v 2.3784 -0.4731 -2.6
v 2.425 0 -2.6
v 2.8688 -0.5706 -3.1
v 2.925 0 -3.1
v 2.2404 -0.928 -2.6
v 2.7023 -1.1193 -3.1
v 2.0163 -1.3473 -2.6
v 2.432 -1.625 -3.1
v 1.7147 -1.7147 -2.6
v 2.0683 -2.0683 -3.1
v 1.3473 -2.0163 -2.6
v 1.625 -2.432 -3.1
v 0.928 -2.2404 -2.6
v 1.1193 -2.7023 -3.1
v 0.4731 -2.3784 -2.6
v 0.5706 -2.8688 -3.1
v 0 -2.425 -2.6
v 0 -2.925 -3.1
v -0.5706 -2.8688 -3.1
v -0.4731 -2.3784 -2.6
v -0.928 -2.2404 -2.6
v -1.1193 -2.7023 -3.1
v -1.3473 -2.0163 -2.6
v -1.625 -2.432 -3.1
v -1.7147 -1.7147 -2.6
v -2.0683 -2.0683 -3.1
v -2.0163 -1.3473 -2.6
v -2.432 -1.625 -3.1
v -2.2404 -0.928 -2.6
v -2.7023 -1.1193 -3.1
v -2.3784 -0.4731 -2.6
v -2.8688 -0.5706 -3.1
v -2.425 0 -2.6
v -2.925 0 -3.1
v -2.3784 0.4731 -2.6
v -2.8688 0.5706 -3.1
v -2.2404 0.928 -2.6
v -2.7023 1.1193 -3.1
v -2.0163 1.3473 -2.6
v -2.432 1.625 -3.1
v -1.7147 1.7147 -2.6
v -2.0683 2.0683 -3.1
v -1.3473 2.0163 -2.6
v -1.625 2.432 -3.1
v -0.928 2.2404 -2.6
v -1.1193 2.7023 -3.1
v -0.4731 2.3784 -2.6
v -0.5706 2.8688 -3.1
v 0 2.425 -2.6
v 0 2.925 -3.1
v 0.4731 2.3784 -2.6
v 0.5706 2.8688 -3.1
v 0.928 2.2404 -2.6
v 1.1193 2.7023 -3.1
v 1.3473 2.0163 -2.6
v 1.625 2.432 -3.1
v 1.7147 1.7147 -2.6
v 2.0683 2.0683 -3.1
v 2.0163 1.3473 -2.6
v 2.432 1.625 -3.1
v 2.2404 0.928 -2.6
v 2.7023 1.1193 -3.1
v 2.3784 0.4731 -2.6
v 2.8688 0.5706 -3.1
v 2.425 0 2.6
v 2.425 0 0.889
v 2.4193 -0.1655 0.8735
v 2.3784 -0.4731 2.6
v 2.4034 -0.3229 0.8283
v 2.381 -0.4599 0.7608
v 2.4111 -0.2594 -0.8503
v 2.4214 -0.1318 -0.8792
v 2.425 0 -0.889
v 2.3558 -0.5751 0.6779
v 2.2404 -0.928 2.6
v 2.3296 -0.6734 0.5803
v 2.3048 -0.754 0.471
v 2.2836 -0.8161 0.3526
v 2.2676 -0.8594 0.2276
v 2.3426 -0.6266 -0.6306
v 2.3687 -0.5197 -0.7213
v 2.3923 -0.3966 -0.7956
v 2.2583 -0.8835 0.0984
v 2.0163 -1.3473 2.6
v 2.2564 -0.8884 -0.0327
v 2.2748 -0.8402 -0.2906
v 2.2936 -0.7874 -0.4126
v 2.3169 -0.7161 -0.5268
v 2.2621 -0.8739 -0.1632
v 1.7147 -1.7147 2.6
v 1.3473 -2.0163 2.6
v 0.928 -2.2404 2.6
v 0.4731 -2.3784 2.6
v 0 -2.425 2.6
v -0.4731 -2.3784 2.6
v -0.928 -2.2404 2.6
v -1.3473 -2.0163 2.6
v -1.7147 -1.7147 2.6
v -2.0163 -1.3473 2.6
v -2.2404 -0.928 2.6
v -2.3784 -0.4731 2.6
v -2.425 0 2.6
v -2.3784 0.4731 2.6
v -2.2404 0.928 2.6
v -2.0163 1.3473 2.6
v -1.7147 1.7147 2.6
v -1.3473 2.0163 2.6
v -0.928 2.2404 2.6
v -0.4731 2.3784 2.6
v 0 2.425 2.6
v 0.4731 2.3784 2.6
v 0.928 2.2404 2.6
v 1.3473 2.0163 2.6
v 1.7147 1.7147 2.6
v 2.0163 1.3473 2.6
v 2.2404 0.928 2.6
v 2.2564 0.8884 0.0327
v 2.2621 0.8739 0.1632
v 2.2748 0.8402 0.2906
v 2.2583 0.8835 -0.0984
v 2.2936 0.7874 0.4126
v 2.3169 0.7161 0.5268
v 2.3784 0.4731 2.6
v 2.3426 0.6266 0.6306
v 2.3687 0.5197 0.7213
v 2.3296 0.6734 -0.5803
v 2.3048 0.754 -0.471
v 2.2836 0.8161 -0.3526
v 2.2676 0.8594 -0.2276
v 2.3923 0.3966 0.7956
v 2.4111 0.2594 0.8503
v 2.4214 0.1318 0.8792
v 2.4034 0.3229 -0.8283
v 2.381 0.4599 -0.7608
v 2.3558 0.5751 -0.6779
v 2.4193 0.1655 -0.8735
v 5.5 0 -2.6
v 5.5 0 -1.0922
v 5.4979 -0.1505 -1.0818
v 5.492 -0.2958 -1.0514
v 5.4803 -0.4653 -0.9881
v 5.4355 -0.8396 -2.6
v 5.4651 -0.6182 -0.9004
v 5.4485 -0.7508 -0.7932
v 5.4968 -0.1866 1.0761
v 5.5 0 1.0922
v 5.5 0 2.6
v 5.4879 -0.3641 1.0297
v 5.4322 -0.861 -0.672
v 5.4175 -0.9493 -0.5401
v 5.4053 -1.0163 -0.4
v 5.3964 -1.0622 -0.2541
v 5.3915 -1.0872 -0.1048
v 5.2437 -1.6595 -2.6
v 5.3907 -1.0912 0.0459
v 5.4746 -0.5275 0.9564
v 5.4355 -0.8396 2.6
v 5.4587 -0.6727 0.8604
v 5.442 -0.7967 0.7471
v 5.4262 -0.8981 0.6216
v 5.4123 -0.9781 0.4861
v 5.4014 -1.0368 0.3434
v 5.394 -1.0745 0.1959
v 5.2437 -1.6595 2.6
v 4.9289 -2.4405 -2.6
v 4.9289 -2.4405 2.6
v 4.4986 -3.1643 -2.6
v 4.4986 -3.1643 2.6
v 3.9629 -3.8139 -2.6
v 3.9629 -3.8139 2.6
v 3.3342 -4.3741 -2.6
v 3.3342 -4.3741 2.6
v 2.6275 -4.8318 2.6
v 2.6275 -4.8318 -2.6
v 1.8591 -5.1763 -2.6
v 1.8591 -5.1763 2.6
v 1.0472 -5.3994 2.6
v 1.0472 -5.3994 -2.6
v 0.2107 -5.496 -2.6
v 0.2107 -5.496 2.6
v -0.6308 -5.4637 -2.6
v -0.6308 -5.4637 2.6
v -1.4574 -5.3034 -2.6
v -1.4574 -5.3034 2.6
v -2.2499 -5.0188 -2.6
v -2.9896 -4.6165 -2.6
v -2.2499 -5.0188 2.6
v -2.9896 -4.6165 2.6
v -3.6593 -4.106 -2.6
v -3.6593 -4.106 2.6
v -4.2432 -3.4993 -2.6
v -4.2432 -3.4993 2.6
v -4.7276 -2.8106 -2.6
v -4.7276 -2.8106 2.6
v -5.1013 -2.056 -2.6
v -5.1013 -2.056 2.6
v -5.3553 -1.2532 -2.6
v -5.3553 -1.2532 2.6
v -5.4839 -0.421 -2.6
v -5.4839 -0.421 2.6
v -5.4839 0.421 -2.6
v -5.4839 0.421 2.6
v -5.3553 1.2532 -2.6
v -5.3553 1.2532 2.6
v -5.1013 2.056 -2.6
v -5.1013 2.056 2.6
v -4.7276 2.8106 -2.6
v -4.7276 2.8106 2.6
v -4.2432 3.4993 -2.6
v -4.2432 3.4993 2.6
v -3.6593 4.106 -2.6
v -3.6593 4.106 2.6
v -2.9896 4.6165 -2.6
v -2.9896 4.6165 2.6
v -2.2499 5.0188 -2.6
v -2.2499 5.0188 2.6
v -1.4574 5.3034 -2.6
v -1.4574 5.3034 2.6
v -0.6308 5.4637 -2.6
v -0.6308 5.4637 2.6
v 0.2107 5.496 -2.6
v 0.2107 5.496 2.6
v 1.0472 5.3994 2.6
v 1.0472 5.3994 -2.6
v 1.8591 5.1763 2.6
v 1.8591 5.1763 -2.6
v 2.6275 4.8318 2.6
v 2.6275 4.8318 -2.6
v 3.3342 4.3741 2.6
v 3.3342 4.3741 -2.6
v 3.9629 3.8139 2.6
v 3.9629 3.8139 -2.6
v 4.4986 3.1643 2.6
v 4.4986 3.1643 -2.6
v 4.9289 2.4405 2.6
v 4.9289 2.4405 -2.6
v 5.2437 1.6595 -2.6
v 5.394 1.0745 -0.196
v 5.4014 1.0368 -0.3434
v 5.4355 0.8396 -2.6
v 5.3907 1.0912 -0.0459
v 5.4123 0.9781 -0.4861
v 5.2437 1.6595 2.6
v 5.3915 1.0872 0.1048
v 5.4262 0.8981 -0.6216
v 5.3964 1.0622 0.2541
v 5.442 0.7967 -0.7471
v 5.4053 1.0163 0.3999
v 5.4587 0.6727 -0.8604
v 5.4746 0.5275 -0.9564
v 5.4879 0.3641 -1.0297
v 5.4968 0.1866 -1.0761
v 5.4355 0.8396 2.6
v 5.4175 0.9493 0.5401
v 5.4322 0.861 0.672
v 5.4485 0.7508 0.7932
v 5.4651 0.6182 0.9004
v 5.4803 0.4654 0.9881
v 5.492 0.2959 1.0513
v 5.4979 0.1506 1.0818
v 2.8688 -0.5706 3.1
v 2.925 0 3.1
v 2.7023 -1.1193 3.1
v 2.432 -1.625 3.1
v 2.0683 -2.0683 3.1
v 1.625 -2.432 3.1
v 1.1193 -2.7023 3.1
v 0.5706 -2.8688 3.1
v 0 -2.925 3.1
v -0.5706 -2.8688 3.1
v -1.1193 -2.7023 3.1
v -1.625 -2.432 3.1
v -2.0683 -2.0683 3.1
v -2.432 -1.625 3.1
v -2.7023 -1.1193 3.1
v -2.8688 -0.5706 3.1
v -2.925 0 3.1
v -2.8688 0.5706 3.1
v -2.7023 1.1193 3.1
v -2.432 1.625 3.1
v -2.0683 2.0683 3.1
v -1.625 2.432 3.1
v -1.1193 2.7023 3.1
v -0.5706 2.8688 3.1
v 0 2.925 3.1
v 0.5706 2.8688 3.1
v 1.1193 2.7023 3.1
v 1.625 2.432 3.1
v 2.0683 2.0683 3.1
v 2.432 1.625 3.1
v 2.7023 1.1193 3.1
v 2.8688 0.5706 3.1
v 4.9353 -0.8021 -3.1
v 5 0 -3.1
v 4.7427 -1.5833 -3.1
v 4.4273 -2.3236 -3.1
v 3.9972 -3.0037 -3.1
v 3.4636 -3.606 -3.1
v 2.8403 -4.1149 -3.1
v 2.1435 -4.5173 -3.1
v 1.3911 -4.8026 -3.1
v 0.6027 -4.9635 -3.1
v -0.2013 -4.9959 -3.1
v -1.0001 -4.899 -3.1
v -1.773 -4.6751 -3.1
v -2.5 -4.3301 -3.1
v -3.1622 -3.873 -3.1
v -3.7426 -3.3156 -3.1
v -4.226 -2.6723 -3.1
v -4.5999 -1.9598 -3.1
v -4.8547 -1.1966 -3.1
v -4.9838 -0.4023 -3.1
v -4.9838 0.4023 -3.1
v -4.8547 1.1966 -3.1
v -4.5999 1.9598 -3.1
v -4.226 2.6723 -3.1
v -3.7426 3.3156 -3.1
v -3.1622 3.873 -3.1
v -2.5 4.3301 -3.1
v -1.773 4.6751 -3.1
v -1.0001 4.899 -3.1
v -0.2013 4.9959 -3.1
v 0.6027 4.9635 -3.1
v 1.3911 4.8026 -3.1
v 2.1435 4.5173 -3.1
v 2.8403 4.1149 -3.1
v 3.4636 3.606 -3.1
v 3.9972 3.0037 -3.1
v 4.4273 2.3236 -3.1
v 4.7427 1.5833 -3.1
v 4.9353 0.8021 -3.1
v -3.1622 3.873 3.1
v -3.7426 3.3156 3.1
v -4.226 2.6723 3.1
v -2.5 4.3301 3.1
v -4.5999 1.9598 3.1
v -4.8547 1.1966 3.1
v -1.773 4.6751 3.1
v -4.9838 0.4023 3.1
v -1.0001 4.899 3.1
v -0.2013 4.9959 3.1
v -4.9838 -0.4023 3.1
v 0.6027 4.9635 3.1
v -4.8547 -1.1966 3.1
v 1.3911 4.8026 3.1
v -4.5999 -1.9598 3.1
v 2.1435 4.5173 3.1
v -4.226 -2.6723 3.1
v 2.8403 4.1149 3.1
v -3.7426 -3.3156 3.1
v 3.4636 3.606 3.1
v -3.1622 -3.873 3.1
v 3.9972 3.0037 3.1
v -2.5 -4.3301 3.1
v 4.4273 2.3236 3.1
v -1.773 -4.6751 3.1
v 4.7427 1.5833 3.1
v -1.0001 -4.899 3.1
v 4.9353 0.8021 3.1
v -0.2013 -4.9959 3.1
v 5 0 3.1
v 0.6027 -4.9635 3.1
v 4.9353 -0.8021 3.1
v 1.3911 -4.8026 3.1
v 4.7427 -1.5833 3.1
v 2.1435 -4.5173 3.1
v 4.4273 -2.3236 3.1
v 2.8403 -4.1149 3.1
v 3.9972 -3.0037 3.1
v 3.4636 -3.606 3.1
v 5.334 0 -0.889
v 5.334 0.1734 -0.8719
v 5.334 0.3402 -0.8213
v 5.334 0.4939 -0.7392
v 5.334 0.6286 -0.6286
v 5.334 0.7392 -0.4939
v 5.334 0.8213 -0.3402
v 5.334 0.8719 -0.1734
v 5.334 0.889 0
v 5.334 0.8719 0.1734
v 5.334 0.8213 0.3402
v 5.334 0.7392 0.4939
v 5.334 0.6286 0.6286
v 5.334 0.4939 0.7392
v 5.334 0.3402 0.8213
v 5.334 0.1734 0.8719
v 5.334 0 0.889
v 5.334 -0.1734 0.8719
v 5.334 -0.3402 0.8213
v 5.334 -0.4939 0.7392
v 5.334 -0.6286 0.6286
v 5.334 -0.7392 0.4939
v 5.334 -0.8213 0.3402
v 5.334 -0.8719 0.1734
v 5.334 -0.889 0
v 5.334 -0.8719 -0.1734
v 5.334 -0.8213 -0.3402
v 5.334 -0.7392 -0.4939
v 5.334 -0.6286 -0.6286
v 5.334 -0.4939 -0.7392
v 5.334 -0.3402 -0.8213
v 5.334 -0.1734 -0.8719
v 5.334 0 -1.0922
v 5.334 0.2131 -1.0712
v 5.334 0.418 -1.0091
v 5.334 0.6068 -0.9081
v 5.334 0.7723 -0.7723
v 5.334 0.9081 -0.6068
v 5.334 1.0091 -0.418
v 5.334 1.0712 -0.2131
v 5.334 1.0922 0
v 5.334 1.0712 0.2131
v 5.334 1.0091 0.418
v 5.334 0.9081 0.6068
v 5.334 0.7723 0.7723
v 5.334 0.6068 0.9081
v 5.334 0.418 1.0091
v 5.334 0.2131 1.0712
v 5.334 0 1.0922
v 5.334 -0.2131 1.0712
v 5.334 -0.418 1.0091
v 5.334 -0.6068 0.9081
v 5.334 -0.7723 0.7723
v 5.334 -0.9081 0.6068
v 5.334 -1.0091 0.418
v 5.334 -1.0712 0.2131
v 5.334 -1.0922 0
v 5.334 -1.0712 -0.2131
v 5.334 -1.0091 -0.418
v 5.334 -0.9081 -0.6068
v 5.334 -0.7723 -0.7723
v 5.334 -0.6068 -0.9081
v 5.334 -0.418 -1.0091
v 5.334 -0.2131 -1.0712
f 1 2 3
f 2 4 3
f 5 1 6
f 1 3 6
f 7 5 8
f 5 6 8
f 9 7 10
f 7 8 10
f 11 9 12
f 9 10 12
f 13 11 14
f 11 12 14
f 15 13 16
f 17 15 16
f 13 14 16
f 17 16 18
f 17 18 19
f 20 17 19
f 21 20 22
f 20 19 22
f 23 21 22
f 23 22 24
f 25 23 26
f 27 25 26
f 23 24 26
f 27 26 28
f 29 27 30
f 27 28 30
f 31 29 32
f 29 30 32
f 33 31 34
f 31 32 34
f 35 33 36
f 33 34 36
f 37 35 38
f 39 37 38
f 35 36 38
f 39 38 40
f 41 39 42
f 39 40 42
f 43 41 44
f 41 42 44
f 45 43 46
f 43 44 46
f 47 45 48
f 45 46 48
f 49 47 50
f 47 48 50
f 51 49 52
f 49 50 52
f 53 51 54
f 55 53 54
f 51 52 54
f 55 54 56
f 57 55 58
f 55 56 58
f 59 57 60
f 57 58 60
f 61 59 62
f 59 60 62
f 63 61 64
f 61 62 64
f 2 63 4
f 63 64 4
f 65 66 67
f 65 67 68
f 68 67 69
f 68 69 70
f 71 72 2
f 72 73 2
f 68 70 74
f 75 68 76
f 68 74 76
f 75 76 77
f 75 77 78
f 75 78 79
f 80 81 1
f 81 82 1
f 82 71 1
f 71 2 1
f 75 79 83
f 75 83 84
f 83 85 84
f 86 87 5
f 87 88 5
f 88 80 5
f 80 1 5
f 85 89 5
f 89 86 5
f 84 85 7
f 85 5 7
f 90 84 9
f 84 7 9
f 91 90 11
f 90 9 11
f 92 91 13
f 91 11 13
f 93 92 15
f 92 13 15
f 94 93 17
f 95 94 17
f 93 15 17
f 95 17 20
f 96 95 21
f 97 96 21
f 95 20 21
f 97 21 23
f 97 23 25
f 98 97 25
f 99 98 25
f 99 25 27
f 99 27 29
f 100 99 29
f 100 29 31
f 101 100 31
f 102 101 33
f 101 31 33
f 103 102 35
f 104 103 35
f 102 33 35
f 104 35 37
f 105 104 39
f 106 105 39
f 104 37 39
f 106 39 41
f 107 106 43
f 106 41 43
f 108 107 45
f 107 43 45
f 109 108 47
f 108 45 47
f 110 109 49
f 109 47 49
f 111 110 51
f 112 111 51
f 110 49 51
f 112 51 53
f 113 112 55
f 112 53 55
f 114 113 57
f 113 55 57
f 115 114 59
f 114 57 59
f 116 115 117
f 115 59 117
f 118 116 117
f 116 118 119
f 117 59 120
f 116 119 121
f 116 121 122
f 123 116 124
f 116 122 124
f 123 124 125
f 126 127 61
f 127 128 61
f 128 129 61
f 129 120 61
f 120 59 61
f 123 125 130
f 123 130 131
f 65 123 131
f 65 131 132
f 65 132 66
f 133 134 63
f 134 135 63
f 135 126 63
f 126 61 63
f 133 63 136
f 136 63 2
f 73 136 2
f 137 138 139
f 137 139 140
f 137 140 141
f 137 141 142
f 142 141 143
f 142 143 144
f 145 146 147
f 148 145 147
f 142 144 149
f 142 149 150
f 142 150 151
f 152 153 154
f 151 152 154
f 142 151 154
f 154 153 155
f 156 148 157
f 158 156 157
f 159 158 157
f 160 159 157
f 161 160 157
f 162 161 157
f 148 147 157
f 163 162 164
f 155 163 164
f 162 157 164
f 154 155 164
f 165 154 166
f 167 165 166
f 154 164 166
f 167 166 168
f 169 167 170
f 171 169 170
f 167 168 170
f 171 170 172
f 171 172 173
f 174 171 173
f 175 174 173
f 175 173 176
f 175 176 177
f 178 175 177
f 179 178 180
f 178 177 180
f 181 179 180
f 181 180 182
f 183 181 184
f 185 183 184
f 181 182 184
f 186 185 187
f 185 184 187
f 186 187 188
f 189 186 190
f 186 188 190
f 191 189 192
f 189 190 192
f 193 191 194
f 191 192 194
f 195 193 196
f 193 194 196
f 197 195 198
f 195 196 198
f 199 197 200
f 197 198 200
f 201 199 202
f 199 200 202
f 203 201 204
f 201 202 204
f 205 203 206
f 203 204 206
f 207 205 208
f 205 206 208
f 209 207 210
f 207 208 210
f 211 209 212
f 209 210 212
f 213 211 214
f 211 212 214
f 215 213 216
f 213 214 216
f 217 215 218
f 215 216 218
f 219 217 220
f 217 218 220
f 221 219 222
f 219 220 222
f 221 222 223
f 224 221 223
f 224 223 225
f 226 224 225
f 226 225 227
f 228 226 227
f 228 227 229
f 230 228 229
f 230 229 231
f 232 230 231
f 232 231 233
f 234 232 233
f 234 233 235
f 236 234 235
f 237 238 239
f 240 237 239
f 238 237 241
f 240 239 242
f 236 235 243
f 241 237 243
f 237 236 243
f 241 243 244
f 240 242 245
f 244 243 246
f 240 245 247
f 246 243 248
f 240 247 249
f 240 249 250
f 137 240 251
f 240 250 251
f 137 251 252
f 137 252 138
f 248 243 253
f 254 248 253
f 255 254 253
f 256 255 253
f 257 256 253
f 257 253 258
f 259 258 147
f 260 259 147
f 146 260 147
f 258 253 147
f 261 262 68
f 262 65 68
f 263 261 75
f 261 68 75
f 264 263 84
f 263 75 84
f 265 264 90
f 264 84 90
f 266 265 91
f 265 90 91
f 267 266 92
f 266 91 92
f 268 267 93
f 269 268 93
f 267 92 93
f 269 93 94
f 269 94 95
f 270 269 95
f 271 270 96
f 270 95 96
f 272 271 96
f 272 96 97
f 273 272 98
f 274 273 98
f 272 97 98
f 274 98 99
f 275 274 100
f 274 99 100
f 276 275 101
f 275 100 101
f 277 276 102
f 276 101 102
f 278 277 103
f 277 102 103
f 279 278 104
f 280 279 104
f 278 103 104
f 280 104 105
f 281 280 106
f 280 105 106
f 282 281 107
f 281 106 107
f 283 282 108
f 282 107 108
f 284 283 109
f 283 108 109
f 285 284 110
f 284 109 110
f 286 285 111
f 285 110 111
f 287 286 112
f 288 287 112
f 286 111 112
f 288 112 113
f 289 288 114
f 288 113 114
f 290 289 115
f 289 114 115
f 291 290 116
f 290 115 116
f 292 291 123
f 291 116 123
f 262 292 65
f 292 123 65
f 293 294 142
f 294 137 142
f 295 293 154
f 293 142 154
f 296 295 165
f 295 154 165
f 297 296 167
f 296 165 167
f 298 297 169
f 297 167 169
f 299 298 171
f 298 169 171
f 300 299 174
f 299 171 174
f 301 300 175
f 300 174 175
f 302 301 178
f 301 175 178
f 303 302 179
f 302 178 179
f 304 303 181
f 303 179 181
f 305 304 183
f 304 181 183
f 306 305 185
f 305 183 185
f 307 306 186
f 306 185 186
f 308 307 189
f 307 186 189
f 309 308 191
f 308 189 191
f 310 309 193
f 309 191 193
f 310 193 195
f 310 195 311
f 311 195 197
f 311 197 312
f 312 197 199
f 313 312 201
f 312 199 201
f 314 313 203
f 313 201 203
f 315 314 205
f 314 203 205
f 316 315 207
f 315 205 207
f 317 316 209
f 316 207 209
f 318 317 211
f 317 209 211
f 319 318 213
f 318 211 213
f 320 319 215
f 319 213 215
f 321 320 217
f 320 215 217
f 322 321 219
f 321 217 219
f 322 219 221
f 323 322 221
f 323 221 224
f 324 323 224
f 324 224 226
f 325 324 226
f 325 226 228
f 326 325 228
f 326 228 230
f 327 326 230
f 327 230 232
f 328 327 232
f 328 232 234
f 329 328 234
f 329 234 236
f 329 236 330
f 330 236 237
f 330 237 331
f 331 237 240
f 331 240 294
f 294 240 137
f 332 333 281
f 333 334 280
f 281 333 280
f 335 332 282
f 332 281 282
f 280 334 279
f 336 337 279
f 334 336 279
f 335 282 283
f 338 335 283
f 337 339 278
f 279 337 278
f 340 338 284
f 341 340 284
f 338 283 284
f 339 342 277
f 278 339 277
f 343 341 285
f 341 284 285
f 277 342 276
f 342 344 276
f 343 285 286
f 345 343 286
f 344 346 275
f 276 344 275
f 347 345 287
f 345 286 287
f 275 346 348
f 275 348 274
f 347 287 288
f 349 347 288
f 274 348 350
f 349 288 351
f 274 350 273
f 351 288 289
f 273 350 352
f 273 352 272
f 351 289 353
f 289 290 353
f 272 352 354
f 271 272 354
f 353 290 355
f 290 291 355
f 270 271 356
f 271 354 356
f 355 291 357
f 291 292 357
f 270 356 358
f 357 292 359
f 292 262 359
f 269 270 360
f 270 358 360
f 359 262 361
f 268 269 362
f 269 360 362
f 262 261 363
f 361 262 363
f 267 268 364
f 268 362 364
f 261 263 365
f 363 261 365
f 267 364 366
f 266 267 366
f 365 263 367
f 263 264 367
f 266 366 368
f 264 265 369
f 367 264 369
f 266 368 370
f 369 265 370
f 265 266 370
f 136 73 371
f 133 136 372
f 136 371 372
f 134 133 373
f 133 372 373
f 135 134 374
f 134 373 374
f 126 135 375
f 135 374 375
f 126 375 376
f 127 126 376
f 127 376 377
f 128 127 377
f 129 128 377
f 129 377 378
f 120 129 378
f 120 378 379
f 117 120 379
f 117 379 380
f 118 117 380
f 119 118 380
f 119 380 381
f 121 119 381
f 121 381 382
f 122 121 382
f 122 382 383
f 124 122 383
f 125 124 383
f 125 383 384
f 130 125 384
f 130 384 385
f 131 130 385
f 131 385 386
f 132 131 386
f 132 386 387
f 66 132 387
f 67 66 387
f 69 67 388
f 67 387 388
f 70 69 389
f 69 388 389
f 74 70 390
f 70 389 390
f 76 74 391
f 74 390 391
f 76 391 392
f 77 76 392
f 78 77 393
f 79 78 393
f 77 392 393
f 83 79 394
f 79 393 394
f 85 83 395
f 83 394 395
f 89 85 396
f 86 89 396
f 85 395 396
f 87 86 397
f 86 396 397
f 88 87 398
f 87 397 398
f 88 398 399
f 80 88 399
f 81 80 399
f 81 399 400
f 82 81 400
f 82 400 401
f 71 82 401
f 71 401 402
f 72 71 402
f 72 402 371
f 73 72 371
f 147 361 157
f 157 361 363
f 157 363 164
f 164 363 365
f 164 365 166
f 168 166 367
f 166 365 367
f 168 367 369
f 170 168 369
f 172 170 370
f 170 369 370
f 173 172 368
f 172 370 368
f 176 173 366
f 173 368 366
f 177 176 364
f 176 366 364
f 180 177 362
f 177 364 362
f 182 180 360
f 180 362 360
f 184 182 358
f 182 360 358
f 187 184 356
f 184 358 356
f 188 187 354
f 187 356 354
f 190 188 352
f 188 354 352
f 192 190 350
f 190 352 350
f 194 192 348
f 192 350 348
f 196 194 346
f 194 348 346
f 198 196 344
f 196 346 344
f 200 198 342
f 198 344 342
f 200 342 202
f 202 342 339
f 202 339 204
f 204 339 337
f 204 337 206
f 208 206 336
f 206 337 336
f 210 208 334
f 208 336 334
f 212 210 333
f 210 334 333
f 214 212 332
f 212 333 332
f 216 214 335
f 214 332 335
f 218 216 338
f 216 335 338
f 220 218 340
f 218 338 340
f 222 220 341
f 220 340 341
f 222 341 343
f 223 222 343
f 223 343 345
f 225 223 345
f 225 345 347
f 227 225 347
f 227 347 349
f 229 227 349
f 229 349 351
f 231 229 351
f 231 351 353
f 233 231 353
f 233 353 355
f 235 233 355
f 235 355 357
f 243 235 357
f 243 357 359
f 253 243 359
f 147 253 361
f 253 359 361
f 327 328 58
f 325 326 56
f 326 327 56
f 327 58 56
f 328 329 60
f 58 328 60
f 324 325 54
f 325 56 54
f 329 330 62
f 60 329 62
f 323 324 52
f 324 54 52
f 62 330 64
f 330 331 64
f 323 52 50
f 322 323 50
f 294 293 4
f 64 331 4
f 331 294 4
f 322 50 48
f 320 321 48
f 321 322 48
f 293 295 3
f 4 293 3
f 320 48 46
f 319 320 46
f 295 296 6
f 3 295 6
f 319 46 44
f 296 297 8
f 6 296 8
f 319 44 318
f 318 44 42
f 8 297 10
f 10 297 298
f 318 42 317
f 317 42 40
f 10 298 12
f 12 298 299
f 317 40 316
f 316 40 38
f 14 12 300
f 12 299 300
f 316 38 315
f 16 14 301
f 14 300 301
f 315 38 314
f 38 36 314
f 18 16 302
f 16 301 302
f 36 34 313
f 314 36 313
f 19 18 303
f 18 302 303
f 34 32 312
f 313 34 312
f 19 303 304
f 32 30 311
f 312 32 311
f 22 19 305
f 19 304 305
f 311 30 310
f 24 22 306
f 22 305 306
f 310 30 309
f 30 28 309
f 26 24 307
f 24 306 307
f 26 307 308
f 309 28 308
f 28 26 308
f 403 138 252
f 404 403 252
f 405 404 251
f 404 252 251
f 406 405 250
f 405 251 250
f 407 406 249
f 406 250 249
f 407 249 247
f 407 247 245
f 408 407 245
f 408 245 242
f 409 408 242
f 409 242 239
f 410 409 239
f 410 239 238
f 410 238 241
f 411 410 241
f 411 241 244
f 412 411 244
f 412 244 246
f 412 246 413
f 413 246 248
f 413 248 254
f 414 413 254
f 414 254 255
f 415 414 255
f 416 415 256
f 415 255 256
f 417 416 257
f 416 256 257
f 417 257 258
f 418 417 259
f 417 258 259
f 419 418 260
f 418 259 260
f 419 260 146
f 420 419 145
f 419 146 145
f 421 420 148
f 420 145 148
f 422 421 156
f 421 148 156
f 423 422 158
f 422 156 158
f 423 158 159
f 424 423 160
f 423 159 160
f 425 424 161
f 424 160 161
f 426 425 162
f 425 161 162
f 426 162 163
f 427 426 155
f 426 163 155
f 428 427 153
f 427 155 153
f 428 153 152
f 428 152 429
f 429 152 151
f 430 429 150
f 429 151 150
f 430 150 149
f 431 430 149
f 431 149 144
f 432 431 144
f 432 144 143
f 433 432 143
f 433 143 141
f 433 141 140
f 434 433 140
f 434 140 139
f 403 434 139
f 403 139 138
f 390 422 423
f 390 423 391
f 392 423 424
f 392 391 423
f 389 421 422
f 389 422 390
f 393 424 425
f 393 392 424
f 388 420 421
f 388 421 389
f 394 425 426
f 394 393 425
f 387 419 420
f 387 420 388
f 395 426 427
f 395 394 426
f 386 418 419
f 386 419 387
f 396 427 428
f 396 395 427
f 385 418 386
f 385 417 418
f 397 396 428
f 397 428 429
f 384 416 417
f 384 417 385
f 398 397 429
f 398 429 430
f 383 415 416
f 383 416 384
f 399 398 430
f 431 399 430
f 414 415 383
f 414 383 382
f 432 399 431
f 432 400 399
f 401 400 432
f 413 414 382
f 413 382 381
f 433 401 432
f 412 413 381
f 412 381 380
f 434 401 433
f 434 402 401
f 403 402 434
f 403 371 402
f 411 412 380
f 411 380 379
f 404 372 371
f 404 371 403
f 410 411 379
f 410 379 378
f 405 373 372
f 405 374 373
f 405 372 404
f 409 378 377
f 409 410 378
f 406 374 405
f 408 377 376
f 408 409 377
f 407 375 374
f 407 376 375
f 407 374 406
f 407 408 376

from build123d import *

# Parameters (mm, degrees)
CUT_EXTRUDE1_START         = 5.842
SKETCH4_R                  = 1.0922
CUT_EXTRUDE1_DEPTH         = 0.508
F_2_56_TAPPED_HOLE2_REACH  = 14.539
F_2_56_TAPPED_HOLE2_BORE_R = 0.889


with BuildPart() as part:
    # Sketch1 → Revolve1 (revolve)
    with BuildSketch(Plane(origin=(0, 0, 0), x_dir=(0, 0, -1), z_dir=(1, 0, 0)), mode=Mode.PRIVATE) as revolve1_sk:
        Polygon((-3.1, 5), (-3.1, 2.925), (-2.6, 2.425), (2.6, 2.425), (3.1, 2.925), (3.1, 5), (2.6, 5.5), (-2.6, 5.5), align=None)
    revolve(revolve1_sk.sketch.rotate(Axis((0, 0, 0), (0, 0, -1)), 90), axis=Axis((0, 0, 0), (0, 0, -1)))

    # Sketch4 → Cut-Extrude1 (cut)
    with BuildSketch(Plane(origin=(0, 0, 0), x_dir=(0, 0, -1), z_dir=(1, 0, 0)).offset(CUT_EXTRUDE1_START)):
        Circle(SKETCH4_R)
    extrude(amount=-CUT_EXTRUDE1_DEPTH, mode=Mode.SUBTRACT)

    # #2-56 Tapped Hole2 bore → #2-56 Tapped Hole2 (cut, up to next)
    with BuildSketch(Plane(origin=(5.334, 0, 0), x_dir=(0, 0, -1), z_dir=(1, 0, 0)), mode=Mode.PRIVATE) as f_2_56_tapped_hole2_sk1:
        Circle(F_2_56_TAPPED_HOLE2_BORE_R)
    f_2_56_tapped_hole2_tool1 = extrude(f_2_56_tapped_hole2_sk1.sketch, amount=-F_2_56_TAPPED_HOLE2_REACH, mode=Mode.PRIVATE) & part.part
    add(f_2_56_tapped_hole2_tool1.solids().sort_by_distance((5.334, 0, 0))[0], mode=Mode.SUBTRACT)


solid = part.part
